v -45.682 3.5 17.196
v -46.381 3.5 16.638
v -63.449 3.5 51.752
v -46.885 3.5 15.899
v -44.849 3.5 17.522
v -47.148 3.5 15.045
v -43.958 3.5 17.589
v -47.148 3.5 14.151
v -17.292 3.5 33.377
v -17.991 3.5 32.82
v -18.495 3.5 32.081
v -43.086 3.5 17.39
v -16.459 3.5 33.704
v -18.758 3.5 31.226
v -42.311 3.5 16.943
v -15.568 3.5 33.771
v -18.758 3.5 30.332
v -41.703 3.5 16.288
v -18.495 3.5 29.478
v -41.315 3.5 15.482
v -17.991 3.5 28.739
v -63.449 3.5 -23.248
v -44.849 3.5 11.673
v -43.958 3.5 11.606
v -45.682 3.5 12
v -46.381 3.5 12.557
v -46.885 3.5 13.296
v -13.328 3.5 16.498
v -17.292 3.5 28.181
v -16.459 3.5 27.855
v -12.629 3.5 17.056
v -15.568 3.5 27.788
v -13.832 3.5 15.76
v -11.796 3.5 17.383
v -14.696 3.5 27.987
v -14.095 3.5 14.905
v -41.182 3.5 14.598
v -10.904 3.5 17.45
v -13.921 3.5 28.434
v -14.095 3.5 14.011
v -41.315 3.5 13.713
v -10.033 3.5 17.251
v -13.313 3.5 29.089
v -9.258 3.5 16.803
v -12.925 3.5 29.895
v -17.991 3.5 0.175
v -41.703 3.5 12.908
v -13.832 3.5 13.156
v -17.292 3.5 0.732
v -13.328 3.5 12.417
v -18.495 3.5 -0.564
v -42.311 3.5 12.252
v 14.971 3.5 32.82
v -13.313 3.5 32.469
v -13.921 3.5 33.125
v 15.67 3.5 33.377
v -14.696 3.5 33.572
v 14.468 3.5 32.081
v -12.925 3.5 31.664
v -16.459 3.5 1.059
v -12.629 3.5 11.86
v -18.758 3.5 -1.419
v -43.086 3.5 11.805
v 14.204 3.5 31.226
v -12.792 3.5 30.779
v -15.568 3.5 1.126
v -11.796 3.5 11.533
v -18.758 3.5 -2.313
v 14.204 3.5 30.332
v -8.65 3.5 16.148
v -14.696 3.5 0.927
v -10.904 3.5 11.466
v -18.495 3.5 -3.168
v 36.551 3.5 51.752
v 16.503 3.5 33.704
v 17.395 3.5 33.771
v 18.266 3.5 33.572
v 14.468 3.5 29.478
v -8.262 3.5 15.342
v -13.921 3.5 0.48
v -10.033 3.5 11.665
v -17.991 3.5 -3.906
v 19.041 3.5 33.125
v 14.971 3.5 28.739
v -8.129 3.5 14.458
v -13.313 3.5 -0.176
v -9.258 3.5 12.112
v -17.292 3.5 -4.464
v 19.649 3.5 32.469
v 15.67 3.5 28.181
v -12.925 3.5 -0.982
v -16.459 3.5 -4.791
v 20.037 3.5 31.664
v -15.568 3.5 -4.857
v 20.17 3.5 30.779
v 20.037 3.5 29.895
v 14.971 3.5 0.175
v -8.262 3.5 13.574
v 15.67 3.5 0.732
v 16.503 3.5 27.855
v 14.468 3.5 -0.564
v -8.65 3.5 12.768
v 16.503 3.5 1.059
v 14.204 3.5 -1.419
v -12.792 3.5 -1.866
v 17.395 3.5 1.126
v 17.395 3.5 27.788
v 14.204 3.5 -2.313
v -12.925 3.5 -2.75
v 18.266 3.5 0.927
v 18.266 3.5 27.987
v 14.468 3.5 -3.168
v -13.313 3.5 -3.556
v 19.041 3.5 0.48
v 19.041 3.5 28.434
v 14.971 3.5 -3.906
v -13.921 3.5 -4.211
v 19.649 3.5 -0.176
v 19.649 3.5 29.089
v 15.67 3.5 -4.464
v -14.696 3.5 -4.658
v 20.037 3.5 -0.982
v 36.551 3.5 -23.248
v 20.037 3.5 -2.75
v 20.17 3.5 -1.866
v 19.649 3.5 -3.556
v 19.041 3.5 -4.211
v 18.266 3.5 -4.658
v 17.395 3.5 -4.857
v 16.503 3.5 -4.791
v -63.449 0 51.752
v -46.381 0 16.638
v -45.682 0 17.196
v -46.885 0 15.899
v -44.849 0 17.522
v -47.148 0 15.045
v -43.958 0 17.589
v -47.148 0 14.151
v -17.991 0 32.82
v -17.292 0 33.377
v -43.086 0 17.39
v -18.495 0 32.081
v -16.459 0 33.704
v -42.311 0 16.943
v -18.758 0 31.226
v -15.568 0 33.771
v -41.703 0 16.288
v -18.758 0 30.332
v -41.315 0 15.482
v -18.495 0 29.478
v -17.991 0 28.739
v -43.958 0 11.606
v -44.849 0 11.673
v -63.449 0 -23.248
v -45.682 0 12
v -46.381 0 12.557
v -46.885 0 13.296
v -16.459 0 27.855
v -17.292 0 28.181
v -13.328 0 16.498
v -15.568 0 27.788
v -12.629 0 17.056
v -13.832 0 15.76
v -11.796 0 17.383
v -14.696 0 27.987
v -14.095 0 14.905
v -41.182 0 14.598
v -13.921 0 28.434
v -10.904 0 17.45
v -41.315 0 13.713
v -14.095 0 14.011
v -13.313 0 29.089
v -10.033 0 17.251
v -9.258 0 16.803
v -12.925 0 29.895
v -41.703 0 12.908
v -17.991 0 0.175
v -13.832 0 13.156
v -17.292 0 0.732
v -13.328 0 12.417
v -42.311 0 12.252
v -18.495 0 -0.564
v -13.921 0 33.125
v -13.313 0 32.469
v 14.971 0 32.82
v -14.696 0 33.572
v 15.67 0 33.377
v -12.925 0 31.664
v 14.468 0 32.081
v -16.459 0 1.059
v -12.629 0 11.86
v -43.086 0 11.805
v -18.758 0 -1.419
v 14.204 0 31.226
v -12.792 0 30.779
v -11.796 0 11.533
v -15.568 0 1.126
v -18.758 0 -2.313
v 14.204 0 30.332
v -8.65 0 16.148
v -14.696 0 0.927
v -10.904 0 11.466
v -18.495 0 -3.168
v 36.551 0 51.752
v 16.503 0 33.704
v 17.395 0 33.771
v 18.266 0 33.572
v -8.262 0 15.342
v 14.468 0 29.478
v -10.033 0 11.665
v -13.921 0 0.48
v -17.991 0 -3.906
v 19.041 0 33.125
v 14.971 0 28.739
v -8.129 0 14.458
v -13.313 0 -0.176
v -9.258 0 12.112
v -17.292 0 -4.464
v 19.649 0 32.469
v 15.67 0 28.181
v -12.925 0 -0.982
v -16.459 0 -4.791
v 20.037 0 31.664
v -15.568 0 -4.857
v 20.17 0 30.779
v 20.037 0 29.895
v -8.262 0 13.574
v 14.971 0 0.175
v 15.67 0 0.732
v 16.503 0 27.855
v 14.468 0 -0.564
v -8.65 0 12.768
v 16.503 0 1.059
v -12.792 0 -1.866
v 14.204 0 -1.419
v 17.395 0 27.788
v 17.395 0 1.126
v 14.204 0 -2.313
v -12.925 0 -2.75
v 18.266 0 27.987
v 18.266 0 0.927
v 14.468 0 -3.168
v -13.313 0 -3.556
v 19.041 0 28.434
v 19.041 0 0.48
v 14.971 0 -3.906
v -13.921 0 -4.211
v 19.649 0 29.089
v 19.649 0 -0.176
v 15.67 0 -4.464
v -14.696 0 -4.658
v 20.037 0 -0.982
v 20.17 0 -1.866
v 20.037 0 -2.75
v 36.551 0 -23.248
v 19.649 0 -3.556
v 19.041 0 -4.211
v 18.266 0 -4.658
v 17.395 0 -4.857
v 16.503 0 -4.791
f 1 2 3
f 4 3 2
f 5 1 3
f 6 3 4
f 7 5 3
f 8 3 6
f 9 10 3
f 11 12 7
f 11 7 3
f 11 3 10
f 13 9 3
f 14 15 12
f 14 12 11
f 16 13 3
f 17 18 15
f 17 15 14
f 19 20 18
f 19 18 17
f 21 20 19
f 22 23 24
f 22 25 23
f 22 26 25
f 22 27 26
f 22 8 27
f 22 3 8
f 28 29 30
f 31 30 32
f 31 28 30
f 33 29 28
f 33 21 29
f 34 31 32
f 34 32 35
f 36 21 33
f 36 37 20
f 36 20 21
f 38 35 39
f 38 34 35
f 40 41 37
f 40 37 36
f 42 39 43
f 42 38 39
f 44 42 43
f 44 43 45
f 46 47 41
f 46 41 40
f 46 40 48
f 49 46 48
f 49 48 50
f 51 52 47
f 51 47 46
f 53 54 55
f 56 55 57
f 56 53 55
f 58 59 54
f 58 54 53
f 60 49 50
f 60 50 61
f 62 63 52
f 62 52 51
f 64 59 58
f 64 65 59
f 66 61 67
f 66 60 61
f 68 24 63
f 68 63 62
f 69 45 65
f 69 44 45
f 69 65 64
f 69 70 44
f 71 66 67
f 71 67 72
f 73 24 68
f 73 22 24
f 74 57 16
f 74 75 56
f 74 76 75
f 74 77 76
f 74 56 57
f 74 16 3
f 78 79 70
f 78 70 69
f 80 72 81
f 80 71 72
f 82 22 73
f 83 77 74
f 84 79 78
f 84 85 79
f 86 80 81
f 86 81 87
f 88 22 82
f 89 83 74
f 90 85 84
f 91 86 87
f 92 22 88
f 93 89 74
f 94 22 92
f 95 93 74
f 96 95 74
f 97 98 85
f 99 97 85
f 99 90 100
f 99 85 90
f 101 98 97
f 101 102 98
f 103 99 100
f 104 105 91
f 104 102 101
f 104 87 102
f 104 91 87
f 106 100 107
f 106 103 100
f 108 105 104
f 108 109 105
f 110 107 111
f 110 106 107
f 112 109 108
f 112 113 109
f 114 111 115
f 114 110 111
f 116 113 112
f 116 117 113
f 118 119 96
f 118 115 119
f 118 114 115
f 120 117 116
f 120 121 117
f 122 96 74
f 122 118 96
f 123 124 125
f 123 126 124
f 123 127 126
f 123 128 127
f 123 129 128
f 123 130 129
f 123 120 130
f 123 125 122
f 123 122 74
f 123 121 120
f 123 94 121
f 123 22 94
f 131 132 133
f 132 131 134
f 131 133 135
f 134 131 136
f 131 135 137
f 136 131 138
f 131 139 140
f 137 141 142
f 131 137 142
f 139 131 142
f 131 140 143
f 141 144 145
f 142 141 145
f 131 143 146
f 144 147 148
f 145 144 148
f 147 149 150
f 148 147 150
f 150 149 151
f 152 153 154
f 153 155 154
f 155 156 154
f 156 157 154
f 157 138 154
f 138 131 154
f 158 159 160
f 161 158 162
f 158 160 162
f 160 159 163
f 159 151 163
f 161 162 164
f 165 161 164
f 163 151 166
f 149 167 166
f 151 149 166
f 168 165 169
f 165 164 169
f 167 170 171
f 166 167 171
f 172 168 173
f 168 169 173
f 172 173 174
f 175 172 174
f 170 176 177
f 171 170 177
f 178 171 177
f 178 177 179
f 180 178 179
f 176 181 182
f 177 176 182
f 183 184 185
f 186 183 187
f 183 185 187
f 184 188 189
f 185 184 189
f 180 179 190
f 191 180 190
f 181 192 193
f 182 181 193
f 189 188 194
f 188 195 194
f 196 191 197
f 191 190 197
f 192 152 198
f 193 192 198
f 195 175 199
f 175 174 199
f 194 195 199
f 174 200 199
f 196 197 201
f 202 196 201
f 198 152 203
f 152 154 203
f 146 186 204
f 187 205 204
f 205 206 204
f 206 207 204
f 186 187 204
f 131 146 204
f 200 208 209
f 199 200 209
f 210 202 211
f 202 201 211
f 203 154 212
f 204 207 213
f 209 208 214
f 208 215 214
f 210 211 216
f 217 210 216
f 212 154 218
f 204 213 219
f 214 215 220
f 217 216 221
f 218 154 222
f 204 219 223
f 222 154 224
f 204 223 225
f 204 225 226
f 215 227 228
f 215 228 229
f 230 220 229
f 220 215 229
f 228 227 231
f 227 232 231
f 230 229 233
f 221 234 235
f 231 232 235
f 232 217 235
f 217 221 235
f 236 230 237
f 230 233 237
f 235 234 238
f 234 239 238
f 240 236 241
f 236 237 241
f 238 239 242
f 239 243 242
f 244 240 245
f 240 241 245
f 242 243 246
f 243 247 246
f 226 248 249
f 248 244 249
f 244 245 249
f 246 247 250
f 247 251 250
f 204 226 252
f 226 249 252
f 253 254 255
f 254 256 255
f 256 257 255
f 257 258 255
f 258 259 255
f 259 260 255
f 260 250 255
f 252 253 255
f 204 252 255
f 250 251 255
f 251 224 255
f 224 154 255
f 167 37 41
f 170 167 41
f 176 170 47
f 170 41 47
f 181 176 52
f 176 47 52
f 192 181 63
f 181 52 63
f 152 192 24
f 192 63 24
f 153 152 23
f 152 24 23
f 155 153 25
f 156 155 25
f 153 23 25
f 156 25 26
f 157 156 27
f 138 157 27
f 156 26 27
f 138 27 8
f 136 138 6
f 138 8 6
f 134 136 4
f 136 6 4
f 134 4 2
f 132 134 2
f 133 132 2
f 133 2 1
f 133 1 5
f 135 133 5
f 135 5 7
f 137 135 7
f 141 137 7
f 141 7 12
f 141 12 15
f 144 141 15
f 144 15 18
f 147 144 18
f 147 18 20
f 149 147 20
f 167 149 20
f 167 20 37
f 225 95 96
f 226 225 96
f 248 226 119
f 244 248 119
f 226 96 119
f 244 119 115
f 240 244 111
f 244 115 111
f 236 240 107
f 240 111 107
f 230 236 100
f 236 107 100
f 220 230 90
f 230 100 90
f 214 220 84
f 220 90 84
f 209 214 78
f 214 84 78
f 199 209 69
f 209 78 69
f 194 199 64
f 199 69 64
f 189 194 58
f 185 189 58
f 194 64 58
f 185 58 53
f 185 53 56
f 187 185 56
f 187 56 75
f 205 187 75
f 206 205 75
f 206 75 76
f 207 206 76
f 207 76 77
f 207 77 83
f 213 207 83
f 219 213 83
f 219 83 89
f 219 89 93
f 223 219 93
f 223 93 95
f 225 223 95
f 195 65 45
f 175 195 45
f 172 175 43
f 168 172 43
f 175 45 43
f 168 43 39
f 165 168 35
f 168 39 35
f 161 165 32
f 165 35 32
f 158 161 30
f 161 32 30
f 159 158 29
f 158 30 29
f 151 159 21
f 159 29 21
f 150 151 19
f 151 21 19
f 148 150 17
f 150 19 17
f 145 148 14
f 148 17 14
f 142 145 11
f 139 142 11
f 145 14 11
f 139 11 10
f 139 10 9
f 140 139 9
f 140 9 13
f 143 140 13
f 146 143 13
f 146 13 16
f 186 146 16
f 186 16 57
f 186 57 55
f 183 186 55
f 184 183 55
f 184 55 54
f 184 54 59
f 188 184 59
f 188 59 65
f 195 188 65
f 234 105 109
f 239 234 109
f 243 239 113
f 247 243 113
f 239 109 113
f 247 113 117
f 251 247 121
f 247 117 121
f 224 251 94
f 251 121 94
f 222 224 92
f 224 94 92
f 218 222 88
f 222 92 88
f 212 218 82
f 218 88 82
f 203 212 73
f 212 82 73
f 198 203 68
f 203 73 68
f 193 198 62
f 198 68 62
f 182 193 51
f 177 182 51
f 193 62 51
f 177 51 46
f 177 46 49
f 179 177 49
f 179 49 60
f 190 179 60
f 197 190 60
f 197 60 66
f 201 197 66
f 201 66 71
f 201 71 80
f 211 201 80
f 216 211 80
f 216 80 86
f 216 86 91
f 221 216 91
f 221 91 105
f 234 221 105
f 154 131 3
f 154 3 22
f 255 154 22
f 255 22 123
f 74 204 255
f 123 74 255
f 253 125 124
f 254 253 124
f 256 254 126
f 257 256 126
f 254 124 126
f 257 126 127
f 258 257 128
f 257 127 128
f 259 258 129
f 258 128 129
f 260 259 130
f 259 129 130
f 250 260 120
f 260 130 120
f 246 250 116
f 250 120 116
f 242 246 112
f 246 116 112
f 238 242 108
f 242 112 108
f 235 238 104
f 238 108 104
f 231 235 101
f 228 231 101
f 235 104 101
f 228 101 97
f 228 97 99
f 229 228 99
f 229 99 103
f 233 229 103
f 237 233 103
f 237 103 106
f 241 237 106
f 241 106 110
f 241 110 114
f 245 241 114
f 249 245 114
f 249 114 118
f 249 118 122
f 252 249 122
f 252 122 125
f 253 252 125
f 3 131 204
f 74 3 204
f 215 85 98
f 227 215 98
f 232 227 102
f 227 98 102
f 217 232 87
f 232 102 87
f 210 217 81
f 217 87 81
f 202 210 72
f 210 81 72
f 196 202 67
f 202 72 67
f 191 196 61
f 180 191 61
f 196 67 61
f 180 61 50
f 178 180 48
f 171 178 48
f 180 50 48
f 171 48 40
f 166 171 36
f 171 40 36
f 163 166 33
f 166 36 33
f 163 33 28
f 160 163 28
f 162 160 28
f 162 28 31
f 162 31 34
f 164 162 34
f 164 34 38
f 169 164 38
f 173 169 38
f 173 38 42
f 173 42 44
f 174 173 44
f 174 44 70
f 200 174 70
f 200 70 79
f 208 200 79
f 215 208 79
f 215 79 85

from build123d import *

# Parameters (mm, degrees)
SKETCH1_W                 = 100
SKETCH1_H                 = 75
BOSS_EXTRUDE1_DEPTH       = 3.5
F_6_0MM_DOWEL_HOLE5_D     = 6
F_6_0MM_DOWEL_HOLE5_DEPTH = 5.2
F_6_0MM_DOWEL_HOLE5_TIP   = 1.802581857
F_6_0MM_DOWEL_HOLE6_D     = 6
F_6_0MM_DOWEL_HOLE6_DEPTH = 5.2
F_6_0MM_DOWEL_HOLE6_TIP   = 1.802581857
F_6_0MM_DOWEL_HOLE7_D     = 6
F_6_0MM_DOWEL_HOLE7_DEPTH = 5.2
F_6_0MM_DOWEL_HOLE7_TIP   = 1.802581857
F_6_0MM_DOWEL_HOLE8_D     = 6
F_6_0MM_DOWEL_HOLE8_DEPTH = 5.2
F_6_0MM_DOWEL_HOLE8_TIP   = 1.802581857
F_6_0MM_DOWEL_HOLE9_D     = 6
F_6_0MM_DOWEL_HOLE10_D    = 6


with BuildPart() as part:
    # Sketch1 → Boss-Extrude1 (new body)
    with BuildSketch(Plane(origin=(0, 0, 0), x_dir=(1, 0, 0), z_dir=(0, 1, 0))):
        with Locations((-13.448964329, -14.251552142)):
            Rectangle(SKETCH1_W, SKETCH1_H)
    extrude(amount=BOSS_EXTRUDE1_DEPTH)

    # Ø6.0mm Dowel Hole5
    with Locations(Plane(origin=(-137.528418299, 0, 99.034606683), x_dir=(-1, 0, 0), z_dir=(0, -1, 0))):
        with Locations((-154.698850598, 100.900481409)):
            Hole(F_6_0MM_DOWEL_HOLE5_D / 2, depth=F_6_0MM_DOWEL_HOLE5_DEPTH)
            with Locations((0, 0, -(F_6_0MM_DOWEL_HOLE5_DEPTH + F_6_0MM_DOWEL_HOLE5_TIP / 2))):  # 118° drill point
                Cone(0, F_6_0MM_DOWEL_HOLE5_D / 2, F_6_0MM_DOWEL_HOLE5_TIP, mode=Mode.SUBTRACT)

    # Ø6.0mm Dowel Hole6
    with Locations(Plane(origin=(-137.528418299, 0, 99.034606683), x_dir=(-1, 0, 0), z_dir=(0, -1, 0))):
        with Locations((-121.736726509, 100.900481409)):
            Hole(F_6_0MM_DOWEL_HOLE6_D / 2, depth=F_6_0MM_DOWEL_HOLE6_DEPTH)
            with Locations((0, 0, -(F_6_0MM_DOWEL_HOLE6_DEPTH + F_6_0MM_DOWEL_HOLE6_TIP / 2))):  # 118° drill point
                Cone(0, F_6_0MM_DOWEL_HOLE6_D / 2, F_6_0MM_DOWEL_HOLE6_TIP, mode=Mode.SUBTRACT)

    # Ø6.0mm Dowel Hole7
    with Locations(Plane(origin=(-137.528418299, 0, 99.034606683), x_dir=(-1, 0, 0), z_dir=(0, -1, 0))):
        with Locations((-154.698850598, 68.255290468)):
            Hole(F_6_0MM_DOWEL_HOLE7_D / 2, depth=F_6_0MM_DOWEL_HOLE7_DEPTH)
            with Locations((0, 0, -(F_6_0MM_DOWEL_HOLE7_DEPTH + F_6_0MM_DOWEL_HOLE7_TIP / 2))):  # 118° drill point
                Cone(0, F_6_0MM_DOWEL_HOLE7_D / 2, F_6_0MM_DOWEL_HOLE7_TIP, mode=Mode.SUBTRACT)

    # Ø6.0mm Dowel Hole8
    with Locations(Plane(origin=(-137.528418299, 0, 99.034606683), x_dir=(-1, 0, 0), z_dir=(0, -1, 0))):
        with Locations((-121.736726509, 68.255290468)):
            Hole(F_6_0MM_DOWEL_HOLE8_D / 2, depth=F_6_0MM_DOWEL_HOLE8_DEPTH)
            with Locations((0, 0, -(F_6_0MM_DOWEL_HOLE8_DEPTH + F_6_0MM_DOWEL_HOLE8_TIP / 2))):  # 118° drill point
                Cone(0, F_6_0MM_DOWEL_HOLE8_D / 2, F_6_0MM_DOWEL_HOLE8_TIP, mode=Mode.SUBTRACT)

    # Ø6.0mm Dowel Hole9 (through all)
    with Locations(Plane(origin=(-137.528418299, 0, 99.034606683), x_dir=(-1, 0, 0), z_dir=(0, -1, 0))):
        with Locations((-93.346603373, 84.436908191)):
            Hole(F_6_0MM_DOWEL_HOLE9_D / 2)

    # Ø6.0mm Dowel Hole10 (through all)
    with Locations(Plane(origin=(-137.528418299, 0, 99.034606683), x_dir=(-1, 0, 0), z_dir=(0, -1, 0))):
        with Locations((-126.399729662, 84.576636181)):
            Hole(F_6_0MM_DOWEL_HOLE10_D / 2)


solid = part.part
